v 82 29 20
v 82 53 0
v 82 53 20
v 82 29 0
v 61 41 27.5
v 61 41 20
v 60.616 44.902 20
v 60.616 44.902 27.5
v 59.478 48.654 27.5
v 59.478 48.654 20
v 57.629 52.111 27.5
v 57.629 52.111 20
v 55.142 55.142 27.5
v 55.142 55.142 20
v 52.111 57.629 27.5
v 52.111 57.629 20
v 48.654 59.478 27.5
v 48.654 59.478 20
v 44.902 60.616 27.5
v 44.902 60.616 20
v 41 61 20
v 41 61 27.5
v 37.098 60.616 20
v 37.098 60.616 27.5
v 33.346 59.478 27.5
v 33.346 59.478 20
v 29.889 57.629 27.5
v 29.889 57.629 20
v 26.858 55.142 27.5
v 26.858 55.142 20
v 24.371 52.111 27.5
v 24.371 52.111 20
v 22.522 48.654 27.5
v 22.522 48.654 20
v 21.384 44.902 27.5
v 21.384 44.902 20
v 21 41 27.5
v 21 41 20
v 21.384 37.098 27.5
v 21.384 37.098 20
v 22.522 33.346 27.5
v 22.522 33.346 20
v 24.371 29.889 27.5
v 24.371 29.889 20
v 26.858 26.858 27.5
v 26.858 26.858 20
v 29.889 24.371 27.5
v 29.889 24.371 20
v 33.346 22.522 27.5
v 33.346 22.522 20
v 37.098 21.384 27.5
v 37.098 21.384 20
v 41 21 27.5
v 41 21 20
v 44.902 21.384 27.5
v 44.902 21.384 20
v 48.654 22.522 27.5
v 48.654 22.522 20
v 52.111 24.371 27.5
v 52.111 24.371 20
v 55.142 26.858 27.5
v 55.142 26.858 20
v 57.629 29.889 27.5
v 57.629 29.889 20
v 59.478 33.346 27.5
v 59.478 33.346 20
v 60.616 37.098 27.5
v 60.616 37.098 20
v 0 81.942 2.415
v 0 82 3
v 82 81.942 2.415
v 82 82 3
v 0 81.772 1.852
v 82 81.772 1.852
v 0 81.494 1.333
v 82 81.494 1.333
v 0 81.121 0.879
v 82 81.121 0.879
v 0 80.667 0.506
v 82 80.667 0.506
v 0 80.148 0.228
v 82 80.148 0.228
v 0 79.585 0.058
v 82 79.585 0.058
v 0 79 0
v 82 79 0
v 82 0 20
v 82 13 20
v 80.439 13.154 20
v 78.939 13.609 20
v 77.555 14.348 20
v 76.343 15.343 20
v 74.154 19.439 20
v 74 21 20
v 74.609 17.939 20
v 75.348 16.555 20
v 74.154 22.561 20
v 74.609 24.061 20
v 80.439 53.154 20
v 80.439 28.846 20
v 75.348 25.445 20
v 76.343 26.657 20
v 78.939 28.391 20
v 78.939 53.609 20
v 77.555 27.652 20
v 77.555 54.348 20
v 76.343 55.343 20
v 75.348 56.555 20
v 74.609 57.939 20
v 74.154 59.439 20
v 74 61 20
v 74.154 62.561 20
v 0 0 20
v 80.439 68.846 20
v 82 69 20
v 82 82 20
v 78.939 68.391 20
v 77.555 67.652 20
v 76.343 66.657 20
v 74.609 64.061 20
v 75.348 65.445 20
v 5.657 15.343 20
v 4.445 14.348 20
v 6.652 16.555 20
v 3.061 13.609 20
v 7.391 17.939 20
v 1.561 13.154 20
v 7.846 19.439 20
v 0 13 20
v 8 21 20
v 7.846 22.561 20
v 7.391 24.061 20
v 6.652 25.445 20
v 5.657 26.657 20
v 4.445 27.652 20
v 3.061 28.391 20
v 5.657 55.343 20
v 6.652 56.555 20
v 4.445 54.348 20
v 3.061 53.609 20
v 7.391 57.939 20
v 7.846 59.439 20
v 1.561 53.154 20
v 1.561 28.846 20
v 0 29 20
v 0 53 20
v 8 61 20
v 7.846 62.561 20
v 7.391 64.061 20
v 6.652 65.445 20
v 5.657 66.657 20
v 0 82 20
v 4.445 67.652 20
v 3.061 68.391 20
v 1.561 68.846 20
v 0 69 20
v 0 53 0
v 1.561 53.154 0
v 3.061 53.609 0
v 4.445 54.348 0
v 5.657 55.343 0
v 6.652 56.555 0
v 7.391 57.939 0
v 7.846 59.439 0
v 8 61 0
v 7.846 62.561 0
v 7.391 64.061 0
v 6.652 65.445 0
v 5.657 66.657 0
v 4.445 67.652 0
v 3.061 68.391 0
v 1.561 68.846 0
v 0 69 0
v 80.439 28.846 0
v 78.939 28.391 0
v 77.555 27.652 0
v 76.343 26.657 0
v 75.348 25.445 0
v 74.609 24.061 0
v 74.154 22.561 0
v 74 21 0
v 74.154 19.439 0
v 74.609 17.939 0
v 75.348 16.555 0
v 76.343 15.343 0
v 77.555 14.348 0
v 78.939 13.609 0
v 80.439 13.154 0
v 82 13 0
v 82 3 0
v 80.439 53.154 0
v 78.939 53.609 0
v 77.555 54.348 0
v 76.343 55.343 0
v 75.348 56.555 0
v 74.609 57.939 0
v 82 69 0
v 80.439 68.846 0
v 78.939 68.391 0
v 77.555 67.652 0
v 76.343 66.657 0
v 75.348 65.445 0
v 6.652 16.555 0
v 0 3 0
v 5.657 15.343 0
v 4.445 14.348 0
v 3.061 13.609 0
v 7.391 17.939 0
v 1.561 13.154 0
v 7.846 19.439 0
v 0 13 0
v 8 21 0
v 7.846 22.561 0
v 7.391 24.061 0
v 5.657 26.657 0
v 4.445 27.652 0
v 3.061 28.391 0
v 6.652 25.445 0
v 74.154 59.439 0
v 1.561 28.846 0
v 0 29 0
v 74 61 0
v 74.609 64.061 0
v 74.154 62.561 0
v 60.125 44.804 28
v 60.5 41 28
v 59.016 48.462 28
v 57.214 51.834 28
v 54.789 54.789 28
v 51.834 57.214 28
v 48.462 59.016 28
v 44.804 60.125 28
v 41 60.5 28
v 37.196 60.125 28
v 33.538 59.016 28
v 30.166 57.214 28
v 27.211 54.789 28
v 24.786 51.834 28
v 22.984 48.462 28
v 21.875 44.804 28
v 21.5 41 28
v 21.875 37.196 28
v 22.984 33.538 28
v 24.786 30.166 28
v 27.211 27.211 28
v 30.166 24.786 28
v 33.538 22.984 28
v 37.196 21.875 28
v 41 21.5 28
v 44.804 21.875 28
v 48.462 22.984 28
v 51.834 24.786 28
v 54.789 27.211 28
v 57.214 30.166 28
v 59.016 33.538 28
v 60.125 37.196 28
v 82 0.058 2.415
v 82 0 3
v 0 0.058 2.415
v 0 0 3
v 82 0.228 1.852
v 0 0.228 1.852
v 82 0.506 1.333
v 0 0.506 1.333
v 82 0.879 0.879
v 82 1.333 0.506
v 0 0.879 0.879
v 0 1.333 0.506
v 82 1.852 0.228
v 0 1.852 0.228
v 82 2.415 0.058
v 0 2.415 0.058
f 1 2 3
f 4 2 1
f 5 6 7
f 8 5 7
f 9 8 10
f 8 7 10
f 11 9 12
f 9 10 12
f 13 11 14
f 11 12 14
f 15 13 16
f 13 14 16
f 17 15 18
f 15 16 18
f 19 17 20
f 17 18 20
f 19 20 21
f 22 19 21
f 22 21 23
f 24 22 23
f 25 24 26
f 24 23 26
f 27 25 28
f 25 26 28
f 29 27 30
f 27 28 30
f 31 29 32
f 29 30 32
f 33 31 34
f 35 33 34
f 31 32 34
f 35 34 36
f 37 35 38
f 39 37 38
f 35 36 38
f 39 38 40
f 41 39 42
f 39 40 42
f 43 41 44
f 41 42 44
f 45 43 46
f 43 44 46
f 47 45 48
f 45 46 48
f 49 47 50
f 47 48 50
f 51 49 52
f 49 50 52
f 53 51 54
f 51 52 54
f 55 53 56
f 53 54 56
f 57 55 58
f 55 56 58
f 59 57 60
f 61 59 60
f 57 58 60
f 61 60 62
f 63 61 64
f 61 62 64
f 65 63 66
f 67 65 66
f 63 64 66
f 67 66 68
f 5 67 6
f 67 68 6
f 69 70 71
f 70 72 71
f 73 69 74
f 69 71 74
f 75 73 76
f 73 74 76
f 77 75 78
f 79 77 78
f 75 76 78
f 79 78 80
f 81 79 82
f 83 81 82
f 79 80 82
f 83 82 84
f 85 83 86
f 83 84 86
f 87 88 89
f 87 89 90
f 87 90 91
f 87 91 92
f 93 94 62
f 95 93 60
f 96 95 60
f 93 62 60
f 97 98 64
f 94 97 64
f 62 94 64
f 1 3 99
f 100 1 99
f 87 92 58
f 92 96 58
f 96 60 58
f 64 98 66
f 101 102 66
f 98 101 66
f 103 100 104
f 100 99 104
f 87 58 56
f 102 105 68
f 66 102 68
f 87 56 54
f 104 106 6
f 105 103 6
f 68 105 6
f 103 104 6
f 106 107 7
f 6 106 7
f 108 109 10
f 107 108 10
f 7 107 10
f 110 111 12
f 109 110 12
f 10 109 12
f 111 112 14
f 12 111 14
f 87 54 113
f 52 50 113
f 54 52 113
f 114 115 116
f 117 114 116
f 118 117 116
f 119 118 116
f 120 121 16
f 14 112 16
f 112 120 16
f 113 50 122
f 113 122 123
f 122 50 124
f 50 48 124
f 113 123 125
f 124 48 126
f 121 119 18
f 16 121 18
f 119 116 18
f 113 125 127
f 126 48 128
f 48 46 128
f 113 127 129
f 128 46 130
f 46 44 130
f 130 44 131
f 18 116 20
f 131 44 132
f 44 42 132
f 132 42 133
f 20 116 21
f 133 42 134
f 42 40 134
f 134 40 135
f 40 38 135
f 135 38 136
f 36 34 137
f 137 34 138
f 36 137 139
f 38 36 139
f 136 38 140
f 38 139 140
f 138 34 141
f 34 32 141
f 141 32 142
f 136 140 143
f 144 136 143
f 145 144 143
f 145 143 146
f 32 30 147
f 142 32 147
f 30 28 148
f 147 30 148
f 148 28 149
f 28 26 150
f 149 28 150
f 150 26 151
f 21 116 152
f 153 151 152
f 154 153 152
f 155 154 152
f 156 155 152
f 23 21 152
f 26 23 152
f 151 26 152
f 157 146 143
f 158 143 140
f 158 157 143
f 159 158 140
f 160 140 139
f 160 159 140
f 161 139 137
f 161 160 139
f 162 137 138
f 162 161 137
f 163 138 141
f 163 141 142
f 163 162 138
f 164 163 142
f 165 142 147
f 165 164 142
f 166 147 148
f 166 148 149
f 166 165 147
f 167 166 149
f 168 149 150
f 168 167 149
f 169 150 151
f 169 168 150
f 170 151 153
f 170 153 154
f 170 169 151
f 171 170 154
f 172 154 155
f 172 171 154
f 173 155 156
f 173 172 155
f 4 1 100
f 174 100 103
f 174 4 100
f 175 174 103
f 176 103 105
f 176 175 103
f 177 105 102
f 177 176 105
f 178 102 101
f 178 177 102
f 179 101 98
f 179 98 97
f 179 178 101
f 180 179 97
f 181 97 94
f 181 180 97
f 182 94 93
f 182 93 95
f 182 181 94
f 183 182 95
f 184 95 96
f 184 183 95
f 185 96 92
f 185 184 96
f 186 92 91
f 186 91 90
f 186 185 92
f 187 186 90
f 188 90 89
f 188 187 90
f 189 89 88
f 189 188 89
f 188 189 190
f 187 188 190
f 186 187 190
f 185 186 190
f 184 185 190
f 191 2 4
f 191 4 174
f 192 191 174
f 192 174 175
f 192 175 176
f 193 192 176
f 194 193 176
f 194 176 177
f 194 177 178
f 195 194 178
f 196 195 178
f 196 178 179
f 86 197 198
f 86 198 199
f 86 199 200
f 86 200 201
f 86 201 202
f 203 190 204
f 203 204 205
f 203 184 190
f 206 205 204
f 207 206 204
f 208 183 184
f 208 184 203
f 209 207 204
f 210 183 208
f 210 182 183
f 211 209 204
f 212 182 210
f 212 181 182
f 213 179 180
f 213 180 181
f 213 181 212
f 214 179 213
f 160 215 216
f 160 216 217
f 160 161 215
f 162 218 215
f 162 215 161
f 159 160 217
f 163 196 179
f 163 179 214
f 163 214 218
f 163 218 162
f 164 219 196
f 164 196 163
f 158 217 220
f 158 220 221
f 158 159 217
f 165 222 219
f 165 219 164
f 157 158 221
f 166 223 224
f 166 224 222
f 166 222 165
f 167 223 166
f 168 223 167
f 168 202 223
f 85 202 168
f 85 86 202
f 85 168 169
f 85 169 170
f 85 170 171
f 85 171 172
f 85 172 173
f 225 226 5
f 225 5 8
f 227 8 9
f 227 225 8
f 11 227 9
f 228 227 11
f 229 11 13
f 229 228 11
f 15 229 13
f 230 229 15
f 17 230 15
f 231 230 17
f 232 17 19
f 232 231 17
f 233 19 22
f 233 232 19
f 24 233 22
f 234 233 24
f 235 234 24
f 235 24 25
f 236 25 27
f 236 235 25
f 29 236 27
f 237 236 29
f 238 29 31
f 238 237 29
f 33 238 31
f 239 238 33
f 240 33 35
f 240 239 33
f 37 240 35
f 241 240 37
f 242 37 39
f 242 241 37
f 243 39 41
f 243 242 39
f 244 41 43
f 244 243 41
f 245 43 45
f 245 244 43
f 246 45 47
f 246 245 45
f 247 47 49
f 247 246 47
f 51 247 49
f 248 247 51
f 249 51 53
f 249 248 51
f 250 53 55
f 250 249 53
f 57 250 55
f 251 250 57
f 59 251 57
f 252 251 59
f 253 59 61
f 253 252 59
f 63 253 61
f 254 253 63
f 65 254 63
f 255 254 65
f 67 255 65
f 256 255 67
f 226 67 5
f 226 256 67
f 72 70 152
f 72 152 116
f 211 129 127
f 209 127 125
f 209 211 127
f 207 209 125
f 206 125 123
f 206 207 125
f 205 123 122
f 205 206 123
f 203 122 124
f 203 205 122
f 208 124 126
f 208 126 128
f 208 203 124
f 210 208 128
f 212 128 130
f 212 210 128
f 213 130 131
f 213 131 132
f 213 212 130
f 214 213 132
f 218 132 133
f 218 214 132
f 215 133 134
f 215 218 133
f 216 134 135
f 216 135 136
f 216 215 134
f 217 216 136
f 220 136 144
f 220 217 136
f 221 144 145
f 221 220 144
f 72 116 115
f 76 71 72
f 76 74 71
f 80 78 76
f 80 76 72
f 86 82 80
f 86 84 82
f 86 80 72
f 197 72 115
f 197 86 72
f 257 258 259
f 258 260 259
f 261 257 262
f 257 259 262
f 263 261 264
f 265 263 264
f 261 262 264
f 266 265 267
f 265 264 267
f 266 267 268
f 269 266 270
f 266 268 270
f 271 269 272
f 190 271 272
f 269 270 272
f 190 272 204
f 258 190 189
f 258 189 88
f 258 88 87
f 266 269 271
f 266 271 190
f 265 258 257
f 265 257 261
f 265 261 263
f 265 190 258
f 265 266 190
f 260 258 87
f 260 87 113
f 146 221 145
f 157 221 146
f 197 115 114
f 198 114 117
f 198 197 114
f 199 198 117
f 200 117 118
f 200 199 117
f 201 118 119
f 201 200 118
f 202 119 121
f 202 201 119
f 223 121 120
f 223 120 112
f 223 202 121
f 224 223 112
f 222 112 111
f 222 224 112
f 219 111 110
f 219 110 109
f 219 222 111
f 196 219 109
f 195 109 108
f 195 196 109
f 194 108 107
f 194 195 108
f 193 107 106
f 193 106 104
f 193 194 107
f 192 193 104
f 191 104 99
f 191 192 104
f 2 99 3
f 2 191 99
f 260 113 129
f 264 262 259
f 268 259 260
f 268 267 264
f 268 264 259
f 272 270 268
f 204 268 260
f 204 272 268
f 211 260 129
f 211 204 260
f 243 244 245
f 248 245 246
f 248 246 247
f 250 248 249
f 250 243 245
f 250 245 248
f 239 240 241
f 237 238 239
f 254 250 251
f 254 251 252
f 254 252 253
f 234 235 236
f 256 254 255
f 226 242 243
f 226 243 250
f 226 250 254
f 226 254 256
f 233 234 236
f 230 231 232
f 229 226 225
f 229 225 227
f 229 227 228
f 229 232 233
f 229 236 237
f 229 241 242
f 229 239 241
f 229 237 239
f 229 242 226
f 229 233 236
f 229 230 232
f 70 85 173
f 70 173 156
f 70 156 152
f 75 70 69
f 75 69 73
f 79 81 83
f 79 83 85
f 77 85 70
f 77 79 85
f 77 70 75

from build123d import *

# Parameters (mm, degrees)
BOSS_EXTRUDE1_DEPTH = 20
SKETCH2_R           = 20
BOSS_EXTRUDE2_DEPTH = 8
CHAMFER1_SIZE       = 0.5
FILLET1_R           = 3


with BuildPart() as part:
    # Sketch1 → Boss-Extrude1 (new body)
    with BuildSketch(Plane.XY):
        with BuildLine():
            Line((0, 69), (0, 82))
            Line((0, 82), (82, 82))
            Line((82, 82), (82, 69))
            ThreePointArc((82, 69), (74, 61), (82, 53))
            Line((82, 53), (82, 29))
            ThreePointArc((82, 29), (74, 21), (82, 13))
            Line((82, 13), (82, 0))
            Line((82, 0), (0, 0))
            Line((0, 0), (0, 13))
            ThreePointArc((0, 13), (8, 21), (0, 29))
            Line((0, 29), (0, 53))
            ThreePointArc((0, 53), (8, 61), (0, 69))
        make_face()
    extrude(amount=BOSS_EXTRUDE1_DEPTH)

    # Sketch2 → Boss-Extrude2 (add)
    with BuildSketch(Plane.XY.offset(20)):
        with Locations((41, 41)):
            Circle(SKETCH2_R)
    extrude(amount=BOSS_EXTRUDE2_DEPTH)

    # Chamfer1
    chamfer1_edges = [part.edges().sort_by_distance(p)[0] for p in [
        (21, 41, 28),
    ]]
    chamfer(chamfer1_edges, length=CHAMFER1_SIZE)

    # Fillet1
    fillet1_edges = [part.edges().sort_by_distance(p)[0] for p in [
        (41, 82, 0),
        (41, 0, 0),
    ]]
    fillet(fillet1_edges, radius=FILLET1_R)


solid = part.part
